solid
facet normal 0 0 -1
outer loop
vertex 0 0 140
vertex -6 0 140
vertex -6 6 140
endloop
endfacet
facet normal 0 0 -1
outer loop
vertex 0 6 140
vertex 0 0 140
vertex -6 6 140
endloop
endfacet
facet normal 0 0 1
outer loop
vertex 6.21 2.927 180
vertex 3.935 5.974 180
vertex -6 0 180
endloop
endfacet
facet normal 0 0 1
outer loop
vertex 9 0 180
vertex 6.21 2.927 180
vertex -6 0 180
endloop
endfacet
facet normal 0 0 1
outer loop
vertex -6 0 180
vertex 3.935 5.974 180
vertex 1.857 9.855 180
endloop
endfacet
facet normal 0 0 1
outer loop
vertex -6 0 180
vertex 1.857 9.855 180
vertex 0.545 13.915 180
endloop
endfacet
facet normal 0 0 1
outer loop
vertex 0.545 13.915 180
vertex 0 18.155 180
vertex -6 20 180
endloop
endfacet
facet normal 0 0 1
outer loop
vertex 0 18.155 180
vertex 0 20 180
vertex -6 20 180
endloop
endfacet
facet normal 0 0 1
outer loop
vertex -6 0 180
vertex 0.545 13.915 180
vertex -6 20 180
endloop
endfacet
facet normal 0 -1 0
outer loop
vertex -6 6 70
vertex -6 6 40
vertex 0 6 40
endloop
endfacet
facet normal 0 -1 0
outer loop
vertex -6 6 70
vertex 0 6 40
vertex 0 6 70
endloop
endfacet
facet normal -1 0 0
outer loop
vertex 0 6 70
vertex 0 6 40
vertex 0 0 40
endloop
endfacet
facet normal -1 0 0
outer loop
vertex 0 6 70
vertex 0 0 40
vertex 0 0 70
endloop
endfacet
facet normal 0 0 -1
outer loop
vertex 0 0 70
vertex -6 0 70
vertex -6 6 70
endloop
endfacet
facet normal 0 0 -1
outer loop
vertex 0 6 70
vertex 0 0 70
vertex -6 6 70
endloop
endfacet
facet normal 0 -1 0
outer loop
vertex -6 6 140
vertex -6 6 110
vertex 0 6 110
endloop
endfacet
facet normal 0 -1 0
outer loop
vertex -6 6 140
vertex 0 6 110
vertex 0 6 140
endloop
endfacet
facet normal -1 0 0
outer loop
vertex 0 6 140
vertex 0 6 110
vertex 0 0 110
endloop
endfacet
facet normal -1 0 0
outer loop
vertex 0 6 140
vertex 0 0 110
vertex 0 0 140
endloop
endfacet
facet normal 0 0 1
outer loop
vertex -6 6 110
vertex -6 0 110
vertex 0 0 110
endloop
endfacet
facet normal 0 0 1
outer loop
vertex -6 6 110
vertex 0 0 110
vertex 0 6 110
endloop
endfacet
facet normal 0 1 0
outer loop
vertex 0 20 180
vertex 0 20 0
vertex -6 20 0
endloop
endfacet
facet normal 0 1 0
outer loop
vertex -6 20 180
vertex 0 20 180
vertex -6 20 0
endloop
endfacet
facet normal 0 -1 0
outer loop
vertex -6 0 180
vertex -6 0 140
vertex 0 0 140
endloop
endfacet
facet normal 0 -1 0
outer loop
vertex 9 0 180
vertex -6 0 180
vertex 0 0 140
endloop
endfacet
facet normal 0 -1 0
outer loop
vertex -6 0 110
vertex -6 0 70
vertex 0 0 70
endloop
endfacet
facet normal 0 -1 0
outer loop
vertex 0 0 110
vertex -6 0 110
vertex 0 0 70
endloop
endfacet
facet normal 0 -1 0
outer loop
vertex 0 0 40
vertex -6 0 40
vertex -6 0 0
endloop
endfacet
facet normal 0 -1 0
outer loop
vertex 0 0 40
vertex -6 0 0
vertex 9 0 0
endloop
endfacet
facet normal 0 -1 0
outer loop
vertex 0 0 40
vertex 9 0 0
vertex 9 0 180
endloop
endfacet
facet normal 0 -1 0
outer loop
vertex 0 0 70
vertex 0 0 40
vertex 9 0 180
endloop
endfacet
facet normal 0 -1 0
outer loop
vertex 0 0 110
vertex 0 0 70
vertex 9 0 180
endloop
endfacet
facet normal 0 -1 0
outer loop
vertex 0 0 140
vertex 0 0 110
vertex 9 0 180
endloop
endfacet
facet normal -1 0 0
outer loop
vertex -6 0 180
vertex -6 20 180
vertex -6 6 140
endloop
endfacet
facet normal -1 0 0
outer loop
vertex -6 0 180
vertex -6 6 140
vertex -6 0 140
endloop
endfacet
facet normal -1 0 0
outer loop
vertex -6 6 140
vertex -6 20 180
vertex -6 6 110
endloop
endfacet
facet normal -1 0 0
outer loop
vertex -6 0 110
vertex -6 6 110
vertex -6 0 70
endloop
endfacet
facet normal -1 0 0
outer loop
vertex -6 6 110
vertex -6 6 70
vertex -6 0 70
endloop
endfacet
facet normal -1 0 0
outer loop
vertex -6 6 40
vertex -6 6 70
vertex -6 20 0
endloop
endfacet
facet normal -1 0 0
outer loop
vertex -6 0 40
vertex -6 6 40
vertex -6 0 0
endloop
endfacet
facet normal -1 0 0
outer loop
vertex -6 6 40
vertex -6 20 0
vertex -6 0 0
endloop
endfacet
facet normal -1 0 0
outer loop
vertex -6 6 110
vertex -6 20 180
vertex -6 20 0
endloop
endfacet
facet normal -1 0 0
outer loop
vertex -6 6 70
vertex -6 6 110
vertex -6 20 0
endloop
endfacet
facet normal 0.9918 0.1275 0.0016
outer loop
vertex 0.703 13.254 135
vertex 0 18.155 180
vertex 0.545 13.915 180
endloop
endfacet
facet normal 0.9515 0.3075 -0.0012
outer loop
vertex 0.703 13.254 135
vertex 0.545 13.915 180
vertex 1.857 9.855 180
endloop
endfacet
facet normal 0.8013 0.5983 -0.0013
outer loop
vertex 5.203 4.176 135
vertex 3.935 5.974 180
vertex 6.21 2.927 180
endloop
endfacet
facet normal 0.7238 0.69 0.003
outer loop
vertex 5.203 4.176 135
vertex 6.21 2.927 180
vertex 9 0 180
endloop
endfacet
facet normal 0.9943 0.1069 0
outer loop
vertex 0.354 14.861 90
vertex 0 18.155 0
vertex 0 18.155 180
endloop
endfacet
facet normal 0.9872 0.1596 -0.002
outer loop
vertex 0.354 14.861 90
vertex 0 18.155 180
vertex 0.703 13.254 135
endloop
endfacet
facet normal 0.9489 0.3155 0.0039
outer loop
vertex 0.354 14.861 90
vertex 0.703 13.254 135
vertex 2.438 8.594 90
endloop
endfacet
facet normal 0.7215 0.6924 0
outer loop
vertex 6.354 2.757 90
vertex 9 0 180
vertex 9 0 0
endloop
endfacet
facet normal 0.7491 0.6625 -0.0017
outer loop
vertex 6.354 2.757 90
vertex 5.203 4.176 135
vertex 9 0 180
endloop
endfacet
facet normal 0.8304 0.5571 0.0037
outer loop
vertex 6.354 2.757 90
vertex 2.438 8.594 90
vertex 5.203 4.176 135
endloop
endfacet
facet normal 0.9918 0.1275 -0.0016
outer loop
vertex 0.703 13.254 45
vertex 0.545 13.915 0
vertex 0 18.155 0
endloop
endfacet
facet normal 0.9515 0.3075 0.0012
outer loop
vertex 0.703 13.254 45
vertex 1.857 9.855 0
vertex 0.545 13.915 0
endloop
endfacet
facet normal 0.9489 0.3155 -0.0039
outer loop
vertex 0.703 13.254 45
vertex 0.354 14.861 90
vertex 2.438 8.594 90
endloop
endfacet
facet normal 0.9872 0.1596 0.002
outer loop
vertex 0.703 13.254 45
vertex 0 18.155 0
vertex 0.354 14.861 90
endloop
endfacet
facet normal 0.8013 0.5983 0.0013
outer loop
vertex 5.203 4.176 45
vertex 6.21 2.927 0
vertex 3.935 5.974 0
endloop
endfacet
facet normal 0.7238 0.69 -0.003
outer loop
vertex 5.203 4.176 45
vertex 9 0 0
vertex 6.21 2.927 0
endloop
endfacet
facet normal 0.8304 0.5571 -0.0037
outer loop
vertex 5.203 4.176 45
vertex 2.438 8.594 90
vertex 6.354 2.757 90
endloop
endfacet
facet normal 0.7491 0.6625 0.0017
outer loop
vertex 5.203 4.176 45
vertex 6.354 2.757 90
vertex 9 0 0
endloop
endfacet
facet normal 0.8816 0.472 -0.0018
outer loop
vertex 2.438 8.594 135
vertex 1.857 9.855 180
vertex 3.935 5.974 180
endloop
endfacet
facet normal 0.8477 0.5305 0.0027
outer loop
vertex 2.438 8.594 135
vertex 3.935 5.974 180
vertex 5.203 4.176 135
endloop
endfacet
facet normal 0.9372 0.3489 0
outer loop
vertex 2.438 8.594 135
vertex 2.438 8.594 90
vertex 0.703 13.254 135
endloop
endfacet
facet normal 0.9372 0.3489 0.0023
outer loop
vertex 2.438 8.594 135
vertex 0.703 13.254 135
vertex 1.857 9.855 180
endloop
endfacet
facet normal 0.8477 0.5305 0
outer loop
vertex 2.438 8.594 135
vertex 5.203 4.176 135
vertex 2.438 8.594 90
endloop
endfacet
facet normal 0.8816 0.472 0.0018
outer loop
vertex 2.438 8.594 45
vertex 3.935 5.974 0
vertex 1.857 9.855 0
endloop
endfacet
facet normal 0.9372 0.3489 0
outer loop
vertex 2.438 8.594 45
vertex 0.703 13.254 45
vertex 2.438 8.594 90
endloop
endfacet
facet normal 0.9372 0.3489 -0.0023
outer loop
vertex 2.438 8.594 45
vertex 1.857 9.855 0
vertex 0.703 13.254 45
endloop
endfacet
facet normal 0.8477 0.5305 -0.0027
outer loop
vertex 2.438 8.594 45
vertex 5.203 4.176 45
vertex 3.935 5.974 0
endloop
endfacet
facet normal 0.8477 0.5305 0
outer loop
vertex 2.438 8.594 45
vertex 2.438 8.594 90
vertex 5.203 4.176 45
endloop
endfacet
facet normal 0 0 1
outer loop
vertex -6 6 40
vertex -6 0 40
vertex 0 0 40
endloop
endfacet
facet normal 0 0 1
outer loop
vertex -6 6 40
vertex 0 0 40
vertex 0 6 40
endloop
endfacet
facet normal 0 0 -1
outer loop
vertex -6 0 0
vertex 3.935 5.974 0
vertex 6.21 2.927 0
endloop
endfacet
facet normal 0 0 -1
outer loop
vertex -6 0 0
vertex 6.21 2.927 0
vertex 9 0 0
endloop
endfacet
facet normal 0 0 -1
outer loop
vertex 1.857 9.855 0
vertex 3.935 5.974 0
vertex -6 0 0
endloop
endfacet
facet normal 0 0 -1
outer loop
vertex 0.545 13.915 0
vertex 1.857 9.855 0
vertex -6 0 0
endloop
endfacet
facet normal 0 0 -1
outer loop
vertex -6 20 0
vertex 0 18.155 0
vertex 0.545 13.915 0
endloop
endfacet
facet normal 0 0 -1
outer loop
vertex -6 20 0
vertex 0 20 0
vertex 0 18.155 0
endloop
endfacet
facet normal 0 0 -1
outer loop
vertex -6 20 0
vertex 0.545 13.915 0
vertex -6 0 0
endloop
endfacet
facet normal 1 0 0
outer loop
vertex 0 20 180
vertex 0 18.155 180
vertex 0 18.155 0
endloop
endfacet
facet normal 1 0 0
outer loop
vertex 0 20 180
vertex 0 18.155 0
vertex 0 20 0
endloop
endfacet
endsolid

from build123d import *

# Parameters (mm, degrees)
BOSS_EXTRU_1_DEPTH      = 180
ESQUISSE2_W             = 30
ESQUISSE2_H             = 6
ENL_V_MAT_EXTRU_1_DEPTH = 6


with BuildPart() as part:
    # Esquisse1 → Boss.-Extru.1 (new body)
    with BuildSketch(Plane.XY):
        with BuildLine():
            Line((0, 0), (9, 0))
            add(Edge.make_bspline(
                [(0, 18.154922759), (0.375552148, 8.111252363), (9, 0)],
                knots=[0.083456033, 0.083456033, 0.083456033, 1, 1, 1], degree=2))
            Line((0, 18.154922759), (0, 20))
            Line((0, 20), (-6, 20))
            Line((-6, 20), (-6, 0))
            Line((-6, 0), (0, 0))
        make_face()
    extrude(amount=BOSS_EXTRU_1_DEPTH)

    # Esquisse2 → Enlèv. mat.-Extru.1 (cut)
    with BuildSketch(Plane.ZY.offset(6)):
        with Locations((55, 3)):
            Rectangle(ESQUISSE2_W, ESQUISSE2_H)
        with Locations((125, 3)):
            Rectangle(ESQUISSE2_W, ESQUISSE2_H)
    extrude(amount=-ENL_V_MAT_EXTRU_1_DEPTH, mode=Mode.SUBTRACT)


solid = part.part
